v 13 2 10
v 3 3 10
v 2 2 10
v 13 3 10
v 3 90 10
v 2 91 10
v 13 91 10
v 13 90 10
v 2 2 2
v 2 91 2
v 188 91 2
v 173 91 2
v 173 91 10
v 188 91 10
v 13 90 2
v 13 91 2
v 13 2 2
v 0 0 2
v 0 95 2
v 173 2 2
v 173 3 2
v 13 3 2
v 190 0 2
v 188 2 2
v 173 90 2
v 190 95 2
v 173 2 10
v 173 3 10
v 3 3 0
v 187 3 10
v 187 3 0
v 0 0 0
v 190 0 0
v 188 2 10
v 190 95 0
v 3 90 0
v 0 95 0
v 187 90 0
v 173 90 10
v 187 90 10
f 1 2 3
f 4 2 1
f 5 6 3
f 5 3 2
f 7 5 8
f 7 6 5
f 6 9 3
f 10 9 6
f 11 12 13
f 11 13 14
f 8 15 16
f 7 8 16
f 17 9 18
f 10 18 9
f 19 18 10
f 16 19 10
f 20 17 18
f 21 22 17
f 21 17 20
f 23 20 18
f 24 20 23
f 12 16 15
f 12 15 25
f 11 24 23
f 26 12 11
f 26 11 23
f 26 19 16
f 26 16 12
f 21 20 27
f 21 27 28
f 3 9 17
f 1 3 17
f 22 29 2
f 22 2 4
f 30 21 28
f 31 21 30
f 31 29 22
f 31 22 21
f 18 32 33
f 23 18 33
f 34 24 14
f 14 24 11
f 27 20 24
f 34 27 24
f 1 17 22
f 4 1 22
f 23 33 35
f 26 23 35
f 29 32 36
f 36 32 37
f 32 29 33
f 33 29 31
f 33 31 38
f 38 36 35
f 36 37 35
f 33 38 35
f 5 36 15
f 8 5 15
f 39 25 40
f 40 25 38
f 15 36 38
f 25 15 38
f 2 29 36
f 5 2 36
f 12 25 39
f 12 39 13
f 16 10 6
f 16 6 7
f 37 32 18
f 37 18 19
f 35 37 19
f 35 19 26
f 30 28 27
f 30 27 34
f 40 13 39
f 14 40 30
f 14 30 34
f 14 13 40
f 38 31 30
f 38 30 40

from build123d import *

# Parameters (mm, degrees)
BOX_W        = 190
BOX_H        = 95
BOX_DEPTH    = 2
BOX001_W     = 186
BOX001_H     = 89
BOX001_DEPTH = 10
BOX002_W     = 184
BOX002_H     = 87
BOX002_DEPTH = 10
BOX003_W     = 160
BOX003_H     = 89
BOX003_DEPTH = 10


with BuildPart() as part:
    # Box → Box (join)
    with BuildSketch(Plane.XY):
        with Locations((95, 47.5)):
            Rectangle(BOX_W, BOX_H)
    extrude(amount=BOX_DEPTH)

    # Box001 → Box001 (join)
    with BuildSketch(Plane(origin=(2, 2, 0), x_dir=(1, 0, 0), z_dir=(0, 0, 1))):
        with Locations((93, 44.5)):
            Rectangle(BOX001_W, BOX001_H)
    extrude(amount=BOX001_DEPTH)

    # Box002 → Box002 (cut)
    with BuildSketch(Plane(origin=(3, 3, 0), x_dir=(1, 0, 0), z_dir=(0, 0, 1))):
        with Locations((92, 43.5)):
            Rectangle(BOX002_W, BOX002_H)
    extrude(amount=BOX002_DEPTH, mode=Mode.SUBTRACT)

    # Box003 → Box003 (cut)
    with BuildSketch(Plane(origin=(13, 2, 2), x_dir=(1, 0, 0), z_dir=(0, 0, 1))):
        with Locations((80, 44.5)):
            Rectangle(BOX003_W, BOX003_H)
    extrude(amount=BOX003_DEPTH, mode=Mode.SUBTRACT)


solid = part.part
